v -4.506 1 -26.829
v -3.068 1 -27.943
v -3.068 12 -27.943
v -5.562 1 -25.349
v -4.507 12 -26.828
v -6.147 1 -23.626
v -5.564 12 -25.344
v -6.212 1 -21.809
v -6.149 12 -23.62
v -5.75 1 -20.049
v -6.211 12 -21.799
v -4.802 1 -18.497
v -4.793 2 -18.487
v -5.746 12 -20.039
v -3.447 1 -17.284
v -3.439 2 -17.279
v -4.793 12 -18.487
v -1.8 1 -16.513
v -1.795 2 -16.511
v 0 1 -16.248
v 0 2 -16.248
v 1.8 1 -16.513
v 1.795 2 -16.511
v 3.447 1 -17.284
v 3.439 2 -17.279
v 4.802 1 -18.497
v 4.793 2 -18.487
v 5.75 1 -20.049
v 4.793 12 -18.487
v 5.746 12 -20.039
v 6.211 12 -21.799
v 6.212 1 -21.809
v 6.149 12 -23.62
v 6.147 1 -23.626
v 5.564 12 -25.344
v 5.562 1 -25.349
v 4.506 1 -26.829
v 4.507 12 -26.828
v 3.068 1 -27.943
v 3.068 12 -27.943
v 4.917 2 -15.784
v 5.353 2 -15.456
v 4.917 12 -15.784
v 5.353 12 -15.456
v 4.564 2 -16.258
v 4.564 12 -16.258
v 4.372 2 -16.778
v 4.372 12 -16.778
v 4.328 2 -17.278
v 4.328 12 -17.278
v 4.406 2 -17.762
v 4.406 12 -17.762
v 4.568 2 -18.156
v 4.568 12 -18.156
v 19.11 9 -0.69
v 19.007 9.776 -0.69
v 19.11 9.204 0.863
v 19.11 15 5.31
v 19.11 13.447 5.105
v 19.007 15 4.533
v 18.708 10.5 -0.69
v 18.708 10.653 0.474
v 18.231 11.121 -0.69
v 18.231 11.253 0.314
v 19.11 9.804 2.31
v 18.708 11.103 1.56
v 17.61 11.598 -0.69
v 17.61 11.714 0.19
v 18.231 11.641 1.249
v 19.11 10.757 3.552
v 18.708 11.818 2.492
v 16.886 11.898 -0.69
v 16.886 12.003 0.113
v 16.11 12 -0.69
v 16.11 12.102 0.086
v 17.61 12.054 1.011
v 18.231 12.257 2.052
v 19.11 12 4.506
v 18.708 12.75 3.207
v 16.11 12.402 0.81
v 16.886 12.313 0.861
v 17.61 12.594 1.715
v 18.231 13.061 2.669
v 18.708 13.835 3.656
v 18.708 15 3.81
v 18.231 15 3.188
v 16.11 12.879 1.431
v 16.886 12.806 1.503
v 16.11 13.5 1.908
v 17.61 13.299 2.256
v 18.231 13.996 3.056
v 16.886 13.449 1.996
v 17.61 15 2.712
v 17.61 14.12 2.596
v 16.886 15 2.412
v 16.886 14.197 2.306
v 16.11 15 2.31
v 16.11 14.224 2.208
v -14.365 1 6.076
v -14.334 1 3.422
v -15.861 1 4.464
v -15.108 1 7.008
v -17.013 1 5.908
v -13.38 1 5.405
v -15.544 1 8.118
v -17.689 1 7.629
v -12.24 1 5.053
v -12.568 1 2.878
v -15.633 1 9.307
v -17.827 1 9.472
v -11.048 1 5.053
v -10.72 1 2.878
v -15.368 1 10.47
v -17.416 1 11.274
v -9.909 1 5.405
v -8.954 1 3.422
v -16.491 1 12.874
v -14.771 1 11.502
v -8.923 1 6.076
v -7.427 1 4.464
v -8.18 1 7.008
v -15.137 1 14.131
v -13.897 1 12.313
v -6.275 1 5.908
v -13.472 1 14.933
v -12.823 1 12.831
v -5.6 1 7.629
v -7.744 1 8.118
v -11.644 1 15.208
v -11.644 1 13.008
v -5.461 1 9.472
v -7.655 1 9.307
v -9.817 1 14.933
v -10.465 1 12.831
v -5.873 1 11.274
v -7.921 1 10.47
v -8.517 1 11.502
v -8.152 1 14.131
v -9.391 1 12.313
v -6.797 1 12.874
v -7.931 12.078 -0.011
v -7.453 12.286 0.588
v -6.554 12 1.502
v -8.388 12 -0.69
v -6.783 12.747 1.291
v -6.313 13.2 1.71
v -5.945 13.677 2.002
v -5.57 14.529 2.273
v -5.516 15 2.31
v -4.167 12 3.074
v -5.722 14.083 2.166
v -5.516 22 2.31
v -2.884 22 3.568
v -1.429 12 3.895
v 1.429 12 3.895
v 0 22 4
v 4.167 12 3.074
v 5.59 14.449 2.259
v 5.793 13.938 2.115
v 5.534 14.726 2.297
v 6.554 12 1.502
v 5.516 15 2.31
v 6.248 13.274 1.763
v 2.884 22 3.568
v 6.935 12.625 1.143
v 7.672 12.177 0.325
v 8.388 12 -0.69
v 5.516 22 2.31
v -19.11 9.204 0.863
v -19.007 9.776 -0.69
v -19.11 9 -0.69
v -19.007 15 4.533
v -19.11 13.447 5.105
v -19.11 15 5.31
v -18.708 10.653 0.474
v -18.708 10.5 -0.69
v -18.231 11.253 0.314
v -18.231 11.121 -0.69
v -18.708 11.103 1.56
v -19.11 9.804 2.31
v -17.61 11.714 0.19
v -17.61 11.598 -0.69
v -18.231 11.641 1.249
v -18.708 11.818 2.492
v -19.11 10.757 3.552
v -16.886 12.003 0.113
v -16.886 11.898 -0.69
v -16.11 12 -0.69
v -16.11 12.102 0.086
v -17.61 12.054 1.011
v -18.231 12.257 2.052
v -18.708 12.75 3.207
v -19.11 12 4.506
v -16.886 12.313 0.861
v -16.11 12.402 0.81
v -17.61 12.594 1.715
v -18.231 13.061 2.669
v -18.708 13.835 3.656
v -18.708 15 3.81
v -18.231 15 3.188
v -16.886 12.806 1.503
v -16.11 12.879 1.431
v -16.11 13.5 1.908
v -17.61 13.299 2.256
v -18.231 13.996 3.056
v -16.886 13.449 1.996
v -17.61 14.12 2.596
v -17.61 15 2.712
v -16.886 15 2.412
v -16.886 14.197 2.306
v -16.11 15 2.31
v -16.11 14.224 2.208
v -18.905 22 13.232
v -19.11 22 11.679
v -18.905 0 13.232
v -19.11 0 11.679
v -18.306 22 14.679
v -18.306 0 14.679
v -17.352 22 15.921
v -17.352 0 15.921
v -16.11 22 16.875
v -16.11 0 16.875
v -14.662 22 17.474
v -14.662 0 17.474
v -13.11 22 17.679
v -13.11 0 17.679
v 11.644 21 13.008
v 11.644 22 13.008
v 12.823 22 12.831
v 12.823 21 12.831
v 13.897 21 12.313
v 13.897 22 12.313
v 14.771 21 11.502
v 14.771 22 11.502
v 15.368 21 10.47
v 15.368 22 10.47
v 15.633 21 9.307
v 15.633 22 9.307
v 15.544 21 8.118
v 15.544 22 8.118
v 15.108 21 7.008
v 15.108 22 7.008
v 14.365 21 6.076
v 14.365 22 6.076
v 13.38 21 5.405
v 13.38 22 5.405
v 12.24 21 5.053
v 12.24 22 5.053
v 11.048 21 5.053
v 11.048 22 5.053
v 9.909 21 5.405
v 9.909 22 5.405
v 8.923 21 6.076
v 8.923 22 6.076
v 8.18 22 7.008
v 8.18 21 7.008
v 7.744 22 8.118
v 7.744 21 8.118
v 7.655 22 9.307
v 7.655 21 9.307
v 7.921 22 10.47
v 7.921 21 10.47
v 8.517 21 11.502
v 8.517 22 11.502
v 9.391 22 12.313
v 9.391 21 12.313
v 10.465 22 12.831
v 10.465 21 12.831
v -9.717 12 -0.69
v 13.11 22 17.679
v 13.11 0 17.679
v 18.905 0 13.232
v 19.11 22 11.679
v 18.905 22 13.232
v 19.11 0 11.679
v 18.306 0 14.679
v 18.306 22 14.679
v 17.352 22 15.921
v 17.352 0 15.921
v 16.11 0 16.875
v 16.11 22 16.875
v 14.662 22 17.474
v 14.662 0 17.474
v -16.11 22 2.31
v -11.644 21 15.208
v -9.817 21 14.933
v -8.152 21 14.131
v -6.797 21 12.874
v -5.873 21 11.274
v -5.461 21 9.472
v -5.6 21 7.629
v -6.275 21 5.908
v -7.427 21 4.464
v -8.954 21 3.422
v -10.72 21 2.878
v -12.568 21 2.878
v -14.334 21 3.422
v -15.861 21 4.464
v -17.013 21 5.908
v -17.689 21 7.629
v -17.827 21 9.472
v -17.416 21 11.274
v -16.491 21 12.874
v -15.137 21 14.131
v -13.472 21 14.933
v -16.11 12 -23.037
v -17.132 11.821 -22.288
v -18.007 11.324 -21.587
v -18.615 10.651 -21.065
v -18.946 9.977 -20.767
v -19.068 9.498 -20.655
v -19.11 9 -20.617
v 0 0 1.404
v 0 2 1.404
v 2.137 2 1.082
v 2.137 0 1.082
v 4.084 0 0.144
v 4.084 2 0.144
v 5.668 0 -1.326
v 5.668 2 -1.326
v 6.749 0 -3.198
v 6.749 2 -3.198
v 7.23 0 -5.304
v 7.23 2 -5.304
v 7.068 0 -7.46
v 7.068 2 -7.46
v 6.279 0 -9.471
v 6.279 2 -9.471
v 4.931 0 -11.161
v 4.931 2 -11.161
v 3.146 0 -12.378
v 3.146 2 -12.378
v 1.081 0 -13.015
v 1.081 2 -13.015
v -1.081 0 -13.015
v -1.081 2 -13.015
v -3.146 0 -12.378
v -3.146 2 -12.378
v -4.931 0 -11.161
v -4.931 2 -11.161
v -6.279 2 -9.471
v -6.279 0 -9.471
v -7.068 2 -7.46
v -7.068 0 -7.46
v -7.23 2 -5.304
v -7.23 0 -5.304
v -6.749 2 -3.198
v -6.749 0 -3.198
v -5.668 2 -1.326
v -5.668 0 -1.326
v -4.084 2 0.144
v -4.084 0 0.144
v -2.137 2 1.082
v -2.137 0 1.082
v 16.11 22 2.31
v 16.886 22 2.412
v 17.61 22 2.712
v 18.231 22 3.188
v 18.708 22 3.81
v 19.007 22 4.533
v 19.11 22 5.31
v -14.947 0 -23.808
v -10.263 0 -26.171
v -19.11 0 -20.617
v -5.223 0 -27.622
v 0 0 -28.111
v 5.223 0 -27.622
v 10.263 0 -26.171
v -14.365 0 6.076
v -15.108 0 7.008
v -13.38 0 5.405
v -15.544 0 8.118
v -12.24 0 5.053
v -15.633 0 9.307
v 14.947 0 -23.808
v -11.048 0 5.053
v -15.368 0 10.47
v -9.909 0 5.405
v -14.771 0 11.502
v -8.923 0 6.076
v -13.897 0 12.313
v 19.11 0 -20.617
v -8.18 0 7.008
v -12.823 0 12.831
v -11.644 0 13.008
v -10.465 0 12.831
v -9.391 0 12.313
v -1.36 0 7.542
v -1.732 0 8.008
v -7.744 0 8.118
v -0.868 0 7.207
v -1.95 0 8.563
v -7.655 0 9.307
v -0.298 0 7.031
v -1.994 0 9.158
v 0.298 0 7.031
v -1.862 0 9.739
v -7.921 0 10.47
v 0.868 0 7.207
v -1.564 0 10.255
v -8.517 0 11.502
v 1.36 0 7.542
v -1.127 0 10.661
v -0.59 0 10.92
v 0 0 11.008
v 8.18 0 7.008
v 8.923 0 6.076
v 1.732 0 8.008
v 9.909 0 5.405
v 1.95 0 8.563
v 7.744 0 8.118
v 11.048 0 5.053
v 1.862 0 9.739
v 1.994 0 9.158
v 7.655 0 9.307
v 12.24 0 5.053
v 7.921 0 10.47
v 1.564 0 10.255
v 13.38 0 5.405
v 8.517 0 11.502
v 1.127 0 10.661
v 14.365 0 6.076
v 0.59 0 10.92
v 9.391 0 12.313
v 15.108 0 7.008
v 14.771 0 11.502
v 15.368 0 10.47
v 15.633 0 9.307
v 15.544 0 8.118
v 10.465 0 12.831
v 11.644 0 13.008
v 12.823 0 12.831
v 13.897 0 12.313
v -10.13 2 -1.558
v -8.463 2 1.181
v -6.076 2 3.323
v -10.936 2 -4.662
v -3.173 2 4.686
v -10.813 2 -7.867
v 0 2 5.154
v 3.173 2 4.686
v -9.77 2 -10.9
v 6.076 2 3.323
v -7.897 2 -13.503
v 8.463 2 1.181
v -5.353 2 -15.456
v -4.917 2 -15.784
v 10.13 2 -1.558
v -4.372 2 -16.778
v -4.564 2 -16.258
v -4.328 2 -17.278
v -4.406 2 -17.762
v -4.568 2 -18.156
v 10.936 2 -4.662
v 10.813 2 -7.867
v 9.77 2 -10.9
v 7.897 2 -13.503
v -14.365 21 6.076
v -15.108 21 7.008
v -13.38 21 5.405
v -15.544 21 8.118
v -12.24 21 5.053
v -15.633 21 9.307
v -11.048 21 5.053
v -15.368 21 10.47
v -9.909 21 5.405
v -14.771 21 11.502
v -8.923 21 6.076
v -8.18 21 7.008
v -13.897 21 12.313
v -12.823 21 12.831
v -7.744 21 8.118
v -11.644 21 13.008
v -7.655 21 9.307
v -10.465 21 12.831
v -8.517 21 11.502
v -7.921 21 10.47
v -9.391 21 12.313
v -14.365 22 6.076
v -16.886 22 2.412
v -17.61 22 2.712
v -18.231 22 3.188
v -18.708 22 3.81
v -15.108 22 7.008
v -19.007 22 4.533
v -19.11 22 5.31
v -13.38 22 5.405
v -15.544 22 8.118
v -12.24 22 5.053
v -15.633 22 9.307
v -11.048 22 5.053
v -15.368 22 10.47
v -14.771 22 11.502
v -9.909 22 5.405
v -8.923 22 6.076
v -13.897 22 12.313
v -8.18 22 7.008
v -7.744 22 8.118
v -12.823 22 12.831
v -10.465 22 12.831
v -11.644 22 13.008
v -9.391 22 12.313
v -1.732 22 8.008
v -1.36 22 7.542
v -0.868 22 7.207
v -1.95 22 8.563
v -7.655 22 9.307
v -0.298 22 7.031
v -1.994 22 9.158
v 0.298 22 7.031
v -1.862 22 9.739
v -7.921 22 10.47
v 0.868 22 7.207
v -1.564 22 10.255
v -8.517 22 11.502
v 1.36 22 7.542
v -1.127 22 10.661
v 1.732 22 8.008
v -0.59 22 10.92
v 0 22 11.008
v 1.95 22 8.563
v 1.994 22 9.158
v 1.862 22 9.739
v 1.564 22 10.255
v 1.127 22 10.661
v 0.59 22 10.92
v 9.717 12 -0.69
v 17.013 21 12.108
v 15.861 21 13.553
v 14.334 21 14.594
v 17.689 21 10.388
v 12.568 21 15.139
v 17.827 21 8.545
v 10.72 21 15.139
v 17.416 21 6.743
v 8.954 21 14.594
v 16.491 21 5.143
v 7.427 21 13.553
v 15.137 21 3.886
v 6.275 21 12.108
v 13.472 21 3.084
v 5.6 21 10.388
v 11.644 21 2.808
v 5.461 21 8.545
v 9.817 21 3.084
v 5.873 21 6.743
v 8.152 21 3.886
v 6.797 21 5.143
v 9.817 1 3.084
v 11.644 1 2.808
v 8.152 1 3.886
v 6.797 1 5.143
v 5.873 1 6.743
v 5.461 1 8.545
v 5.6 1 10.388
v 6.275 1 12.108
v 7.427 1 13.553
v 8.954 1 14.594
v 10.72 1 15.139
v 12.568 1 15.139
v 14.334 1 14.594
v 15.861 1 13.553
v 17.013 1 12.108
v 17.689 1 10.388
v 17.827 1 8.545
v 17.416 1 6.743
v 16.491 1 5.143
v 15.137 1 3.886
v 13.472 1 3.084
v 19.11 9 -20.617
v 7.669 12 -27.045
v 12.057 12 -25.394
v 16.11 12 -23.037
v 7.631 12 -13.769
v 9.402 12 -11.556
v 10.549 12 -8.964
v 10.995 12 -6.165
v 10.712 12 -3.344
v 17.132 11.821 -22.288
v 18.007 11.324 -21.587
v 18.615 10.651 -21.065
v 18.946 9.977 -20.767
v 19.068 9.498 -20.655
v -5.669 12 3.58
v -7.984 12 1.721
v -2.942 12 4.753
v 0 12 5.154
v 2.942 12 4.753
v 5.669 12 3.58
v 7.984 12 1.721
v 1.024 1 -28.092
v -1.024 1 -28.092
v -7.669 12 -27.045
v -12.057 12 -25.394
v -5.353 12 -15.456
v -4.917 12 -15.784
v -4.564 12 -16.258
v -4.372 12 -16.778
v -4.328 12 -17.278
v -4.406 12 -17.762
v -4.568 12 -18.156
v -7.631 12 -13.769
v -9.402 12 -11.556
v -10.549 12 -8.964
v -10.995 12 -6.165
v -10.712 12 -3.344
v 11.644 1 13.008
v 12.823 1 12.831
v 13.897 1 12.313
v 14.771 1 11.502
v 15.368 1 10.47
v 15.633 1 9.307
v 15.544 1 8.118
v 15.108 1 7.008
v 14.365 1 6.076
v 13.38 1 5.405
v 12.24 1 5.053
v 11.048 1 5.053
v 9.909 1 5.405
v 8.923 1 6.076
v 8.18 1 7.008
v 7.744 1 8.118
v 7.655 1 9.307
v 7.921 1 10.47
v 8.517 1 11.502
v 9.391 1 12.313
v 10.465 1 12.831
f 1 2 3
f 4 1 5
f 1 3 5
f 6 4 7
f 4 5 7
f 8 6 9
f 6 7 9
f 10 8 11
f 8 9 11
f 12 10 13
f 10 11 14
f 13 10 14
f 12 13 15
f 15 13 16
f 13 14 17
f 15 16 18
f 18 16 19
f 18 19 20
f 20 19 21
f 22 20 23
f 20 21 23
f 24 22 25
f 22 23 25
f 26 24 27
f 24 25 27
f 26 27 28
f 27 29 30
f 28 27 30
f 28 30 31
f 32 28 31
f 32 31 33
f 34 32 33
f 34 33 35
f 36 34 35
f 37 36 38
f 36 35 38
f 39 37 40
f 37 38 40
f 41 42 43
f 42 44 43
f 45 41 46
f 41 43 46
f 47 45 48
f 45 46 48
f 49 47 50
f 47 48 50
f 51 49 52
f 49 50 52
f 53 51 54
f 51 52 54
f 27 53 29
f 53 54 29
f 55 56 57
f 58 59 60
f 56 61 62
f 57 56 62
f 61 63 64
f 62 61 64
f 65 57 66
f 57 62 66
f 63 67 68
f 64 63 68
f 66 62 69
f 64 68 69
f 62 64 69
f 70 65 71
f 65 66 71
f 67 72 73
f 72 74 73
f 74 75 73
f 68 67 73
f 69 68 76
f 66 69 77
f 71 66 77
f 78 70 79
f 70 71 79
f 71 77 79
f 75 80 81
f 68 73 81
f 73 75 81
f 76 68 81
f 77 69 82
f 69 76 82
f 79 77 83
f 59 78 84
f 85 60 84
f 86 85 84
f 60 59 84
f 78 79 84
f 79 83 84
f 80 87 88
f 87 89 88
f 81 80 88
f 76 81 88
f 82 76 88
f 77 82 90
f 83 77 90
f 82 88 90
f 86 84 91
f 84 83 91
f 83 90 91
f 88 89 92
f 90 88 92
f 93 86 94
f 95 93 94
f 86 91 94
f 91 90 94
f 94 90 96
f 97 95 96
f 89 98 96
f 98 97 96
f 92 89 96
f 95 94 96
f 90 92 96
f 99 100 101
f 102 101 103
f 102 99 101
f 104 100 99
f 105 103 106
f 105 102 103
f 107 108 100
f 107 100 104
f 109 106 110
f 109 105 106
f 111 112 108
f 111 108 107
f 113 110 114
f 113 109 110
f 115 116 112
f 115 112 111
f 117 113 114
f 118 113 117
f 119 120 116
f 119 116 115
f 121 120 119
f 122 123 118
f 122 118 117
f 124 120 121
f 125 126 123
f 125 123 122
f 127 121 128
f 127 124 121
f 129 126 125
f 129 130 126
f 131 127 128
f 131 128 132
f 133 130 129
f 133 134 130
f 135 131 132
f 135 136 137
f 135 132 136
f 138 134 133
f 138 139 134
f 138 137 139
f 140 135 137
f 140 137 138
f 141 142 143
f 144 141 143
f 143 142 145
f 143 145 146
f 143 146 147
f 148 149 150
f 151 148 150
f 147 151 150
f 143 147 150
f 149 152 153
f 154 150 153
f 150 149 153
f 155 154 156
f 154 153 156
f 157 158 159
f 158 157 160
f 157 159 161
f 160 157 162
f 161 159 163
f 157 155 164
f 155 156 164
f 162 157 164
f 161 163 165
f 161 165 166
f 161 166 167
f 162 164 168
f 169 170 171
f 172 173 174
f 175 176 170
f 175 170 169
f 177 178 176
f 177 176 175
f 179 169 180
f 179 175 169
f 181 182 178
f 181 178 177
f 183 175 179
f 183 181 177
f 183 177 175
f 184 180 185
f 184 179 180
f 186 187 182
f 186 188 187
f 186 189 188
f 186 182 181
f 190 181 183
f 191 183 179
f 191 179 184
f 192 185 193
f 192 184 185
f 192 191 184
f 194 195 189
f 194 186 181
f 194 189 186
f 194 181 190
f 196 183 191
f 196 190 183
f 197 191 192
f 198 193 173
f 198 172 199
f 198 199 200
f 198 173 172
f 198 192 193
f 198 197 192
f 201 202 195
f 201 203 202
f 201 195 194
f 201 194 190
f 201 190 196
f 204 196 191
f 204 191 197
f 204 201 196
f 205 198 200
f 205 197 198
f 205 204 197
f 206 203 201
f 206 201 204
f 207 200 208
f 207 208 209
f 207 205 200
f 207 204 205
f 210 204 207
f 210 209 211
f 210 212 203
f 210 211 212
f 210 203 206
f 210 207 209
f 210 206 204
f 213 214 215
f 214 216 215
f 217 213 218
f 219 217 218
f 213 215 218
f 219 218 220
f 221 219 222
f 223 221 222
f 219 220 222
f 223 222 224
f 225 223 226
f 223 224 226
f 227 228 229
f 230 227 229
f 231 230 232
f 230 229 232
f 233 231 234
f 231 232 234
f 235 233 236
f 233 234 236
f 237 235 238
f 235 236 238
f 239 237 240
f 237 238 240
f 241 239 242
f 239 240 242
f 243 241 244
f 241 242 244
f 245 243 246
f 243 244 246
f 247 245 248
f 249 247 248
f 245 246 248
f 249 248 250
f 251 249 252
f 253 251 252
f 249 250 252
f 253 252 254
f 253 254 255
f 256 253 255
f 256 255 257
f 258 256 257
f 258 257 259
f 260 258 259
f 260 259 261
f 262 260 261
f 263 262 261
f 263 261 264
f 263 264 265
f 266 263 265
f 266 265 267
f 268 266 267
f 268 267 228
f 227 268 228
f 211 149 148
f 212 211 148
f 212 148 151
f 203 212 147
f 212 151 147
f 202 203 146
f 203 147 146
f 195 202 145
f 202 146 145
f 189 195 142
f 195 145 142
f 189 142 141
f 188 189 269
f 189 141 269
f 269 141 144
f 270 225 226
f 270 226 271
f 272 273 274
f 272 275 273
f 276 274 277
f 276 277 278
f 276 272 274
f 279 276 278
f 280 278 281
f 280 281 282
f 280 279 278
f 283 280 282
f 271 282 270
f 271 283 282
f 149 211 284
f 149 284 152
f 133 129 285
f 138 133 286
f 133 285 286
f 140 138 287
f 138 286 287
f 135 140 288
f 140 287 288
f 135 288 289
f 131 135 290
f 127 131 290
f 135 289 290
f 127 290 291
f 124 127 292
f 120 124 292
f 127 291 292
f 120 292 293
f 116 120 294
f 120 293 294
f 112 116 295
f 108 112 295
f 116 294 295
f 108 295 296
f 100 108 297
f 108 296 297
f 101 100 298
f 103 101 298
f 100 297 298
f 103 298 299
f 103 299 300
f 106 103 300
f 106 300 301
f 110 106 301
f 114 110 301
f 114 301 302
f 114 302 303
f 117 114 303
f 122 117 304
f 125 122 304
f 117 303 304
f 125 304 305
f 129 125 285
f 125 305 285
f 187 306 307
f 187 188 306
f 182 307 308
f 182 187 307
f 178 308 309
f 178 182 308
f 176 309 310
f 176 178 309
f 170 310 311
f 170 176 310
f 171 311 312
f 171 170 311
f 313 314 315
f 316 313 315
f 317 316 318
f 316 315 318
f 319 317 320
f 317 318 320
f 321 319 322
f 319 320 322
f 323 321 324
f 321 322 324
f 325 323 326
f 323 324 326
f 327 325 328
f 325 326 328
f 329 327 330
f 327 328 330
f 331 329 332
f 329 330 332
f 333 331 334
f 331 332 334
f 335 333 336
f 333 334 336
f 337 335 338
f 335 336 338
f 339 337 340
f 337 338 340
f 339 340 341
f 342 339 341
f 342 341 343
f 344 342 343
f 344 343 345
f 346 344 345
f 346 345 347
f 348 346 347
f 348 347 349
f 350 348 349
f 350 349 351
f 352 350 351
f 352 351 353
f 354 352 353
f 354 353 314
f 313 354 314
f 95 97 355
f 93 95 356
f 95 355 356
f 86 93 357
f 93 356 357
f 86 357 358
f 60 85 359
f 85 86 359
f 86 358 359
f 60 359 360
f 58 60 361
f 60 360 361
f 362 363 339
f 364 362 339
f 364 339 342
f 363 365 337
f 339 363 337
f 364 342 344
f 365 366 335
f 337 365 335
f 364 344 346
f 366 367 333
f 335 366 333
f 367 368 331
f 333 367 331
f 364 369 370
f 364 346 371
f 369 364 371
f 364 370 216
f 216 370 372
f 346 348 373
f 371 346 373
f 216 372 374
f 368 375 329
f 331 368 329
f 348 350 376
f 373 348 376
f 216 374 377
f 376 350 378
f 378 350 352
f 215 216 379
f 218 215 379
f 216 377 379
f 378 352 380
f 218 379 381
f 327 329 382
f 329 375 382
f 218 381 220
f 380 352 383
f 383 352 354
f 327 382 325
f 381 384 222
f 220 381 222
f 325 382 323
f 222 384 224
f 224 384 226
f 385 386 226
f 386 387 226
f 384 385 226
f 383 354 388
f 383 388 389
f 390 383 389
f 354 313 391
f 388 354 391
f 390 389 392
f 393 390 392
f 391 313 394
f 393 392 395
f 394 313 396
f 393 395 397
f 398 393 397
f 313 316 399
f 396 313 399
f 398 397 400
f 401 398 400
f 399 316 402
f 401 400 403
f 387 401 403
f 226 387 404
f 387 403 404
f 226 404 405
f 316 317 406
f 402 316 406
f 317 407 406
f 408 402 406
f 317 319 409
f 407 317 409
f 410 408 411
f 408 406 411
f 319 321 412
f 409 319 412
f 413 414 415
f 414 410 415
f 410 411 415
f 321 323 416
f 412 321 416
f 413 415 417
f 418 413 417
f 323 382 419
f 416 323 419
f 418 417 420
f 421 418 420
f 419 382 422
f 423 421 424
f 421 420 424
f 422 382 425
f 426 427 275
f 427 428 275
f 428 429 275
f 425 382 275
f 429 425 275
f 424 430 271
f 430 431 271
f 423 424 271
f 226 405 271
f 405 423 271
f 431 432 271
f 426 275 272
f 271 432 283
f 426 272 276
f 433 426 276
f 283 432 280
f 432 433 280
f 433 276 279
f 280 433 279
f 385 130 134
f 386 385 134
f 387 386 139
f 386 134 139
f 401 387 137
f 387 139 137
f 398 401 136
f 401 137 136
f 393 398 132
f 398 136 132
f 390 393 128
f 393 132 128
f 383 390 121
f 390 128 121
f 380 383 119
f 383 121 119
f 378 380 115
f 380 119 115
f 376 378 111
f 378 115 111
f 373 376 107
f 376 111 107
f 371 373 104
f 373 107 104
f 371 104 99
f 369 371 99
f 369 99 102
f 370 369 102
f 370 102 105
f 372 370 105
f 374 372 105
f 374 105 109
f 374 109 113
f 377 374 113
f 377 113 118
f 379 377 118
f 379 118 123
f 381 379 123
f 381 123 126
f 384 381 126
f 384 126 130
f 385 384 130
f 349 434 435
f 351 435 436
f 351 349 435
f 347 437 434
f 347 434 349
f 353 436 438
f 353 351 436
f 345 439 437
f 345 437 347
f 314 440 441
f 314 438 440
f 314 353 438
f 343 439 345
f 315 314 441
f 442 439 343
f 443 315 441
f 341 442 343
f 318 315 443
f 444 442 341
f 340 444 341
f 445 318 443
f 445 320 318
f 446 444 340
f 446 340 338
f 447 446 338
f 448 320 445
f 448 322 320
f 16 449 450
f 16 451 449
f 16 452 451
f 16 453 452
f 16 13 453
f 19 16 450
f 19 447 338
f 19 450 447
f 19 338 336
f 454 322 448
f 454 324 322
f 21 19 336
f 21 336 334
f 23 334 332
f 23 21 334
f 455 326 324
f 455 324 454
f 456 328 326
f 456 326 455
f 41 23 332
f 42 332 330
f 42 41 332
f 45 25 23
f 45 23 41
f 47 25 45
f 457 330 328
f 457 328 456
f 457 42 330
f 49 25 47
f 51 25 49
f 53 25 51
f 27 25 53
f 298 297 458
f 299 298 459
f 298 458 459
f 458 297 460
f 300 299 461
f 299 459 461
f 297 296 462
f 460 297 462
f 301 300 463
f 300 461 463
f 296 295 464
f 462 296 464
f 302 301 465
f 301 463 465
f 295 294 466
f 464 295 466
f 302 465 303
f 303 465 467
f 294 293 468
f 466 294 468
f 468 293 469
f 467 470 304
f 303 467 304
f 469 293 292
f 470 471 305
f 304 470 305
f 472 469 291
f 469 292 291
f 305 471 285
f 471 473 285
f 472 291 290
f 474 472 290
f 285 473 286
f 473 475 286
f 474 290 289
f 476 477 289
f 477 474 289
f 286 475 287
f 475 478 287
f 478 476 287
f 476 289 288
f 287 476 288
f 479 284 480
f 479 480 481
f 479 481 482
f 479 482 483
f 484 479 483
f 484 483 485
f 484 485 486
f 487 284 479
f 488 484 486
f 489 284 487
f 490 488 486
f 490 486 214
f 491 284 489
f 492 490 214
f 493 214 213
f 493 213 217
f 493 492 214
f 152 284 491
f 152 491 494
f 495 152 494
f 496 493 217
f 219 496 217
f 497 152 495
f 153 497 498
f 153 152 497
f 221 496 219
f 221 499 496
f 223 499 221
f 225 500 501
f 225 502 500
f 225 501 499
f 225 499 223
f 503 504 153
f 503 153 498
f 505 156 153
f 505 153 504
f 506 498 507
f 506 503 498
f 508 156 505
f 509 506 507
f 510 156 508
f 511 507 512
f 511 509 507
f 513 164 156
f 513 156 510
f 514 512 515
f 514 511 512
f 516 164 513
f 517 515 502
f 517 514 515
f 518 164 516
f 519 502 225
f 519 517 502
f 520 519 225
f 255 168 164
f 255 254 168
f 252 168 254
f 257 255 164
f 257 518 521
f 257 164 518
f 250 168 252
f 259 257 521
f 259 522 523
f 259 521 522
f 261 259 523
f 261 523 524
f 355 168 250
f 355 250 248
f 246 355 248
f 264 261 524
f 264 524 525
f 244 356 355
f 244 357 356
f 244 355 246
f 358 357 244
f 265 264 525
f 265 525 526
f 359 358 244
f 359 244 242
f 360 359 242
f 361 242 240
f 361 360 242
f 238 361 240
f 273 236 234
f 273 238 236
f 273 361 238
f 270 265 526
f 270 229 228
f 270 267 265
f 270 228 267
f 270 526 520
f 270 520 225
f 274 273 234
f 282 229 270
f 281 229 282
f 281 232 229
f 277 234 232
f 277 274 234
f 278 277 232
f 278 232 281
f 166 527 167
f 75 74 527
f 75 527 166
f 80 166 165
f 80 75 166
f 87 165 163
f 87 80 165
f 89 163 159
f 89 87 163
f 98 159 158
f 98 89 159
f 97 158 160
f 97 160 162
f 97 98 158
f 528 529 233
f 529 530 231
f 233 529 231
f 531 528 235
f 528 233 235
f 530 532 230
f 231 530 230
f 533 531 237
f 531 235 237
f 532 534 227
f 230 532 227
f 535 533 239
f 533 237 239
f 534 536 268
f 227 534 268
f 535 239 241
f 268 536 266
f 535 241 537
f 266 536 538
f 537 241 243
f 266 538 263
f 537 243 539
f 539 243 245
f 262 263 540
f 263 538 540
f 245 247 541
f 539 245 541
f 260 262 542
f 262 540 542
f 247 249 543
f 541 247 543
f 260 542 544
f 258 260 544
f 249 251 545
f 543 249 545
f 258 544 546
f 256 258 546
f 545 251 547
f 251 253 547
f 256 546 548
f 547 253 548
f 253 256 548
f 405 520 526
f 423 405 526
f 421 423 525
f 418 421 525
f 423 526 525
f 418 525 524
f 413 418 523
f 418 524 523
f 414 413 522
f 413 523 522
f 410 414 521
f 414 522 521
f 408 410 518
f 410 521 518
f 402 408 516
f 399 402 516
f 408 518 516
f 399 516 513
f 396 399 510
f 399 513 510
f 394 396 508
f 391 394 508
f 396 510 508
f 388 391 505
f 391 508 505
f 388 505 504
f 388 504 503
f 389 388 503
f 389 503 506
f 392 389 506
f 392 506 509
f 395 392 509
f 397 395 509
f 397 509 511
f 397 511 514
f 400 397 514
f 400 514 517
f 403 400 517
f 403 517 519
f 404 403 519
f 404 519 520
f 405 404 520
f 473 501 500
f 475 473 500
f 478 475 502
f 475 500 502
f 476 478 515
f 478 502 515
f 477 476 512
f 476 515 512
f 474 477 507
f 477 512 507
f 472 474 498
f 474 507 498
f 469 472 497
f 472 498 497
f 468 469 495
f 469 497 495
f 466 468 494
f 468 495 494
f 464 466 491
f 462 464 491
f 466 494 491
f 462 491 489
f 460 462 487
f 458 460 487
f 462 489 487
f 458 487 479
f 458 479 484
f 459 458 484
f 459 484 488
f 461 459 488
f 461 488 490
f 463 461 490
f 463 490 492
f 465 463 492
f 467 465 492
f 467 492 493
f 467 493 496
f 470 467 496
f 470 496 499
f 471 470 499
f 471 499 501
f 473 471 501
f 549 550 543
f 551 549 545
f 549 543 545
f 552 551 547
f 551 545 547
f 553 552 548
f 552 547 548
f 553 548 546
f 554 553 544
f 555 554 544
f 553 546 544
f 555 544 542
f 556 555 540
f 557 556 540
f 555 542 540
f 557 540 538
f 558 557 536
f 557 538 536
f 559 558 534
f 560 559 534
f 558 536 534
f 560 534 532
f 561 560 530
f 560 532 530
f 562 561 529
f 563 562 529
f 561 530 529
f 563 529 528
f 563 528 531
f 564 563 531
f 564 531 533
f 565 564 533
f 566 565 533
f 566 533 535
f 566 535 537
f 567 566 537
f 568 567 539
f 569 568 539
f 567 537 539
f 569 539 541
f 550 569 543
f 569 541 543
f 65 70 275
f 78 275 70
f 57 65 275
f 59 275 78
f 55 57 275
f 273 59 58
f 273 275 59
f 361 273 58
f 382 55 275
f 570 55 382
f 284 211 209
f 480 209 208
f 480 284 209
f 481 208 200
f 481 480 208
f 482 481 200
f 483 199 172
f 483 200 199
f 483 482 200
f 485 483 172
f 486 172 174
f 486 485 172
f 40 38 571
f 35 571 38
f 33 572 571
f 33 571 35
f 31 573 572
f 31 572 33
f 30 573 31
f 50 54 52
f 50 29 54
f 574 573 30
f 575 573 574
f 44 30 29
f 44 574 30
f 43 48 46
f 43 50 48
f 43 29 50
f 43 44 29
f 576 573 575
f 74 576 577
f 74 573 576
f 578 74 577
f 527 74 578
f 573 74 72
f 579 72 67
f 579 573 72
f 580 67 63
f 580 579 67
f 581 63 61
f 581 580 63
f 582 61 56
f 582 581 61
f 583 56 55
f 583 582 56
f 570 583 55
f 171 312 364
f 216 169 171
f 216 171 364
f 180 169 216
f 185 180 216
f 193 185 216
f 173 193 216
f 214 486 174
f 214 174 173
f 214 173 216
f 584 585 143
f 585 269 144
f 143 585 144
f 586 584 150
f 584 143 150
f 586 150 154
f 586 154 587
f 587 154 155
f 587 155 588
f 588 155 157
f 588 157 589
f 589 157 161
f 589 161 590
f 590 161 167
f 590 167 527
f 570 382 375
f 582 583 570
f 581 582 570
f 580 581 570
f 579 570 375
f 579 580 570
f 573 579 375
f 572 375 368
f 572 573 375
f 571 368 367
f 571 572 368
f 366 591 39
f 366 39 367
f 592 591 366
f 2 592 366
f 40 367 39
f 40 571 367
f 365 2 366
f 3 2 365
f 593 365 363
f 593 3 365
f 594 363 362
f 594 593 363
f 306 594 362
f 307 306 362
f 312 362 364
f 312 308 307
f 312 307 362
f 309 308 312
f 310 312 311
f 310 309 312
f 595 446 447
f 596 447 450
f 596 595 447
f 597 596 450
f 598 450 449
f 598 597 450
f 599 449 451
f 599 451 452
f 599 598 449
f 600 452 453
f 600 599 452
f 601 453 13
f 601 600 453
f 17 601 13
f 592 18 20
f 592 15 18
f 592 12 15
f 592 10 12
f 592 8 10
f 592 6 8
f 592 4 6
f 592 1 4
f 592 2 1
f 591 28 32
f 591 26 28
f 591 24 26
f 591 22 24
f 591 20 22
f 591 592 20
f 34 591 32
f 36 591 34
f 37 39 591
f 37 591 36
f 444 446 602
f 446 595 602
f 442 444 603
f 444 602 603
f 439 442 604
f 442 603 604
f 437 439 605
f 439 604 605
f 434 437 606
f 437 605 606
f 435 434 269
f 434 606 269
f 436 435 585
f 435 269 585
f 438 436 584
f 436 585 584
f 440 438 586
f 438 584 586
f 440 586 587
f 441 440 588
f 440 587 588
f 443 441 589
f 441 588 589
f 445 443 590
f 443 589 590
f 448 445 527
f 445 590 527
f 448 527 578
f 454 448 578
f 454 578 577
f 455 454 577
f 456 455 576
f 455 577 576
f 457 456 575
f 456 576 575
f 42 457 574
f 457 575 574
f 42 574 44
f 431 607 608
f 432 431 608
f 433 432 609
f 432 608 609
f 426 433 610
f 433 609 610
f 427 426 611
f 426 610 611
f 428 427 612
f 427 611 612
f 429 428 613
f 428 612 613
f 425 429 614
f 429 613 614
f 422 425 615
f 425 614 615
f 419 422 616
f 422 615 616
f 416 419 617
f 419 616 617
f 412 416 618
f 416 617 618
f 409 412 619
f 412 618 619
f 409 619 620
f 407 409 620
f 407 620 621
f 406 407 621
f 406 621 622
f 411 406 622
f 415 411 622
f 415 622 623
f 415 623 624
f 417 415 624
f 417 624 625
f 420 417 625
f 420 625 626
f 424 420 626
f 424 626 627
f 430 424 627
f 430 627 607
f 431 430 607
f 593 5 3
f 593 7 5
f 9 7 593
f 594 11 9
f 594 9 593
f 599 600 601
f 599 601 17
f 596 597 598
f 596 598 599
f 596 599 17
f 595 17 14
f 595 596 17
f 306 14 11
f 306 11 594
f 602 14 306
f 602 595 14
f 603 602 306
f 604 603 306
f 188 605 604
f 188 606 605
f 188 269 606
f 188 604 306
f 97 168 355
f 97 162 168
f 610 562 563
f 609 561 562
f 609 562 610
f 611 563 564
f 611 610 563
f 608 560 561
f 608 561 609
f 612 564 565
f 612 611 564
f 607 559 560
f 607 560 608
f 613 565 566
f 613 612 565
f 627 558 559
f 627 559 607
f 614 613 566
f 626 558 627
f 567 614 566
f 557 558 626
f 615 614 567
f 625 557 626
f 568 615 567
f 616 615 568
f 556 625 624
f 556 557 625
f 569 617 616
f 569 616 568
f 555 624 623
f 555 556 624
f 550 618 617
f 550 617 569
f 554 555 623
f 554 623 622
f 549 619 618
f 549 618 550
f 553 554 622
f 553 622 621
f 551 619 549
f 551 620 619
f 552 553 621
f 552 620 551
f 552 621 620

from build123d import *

# Parameters (mm, degrees)
SKETCH1_R           = 34.445
BOSS_EXTRUDE1_DEPTH = 22
SKETCH15_R          = 34.445
CUT_EXTRUDE2_DEPTH  = 54.450126754
CUT_EXTRUDE4_START  = -1
SKETCH17_R          = 6.2
CUT_EXTRUDE4_DEPTH  = 20
SKETCH18_R          = 7.25
CUT_EXTRUDE5_DEPTH  = 41.489614217
SKETCH19_R          = 6.25
CUT_EXTRUDE7_DEPTH  = 21
SKETCH20_R          = 9.845995641
CUT_EXTRUDE9_DEPTH  = 10
FILLET12_R          = 6
SKETCH23_R          = 4
SKETCH23_R_2        = 2
CUT_EXTRUDE10_DEPTH = 41.489614217
CUT_EXTRUDE11_START = -12
CUT_EXTRUDE11_DEPTH = 29.489614217
FILLET19_R          = 3
SKETCH25_R          = 11
CUT_EXTRUDE12_DEPTH = 10
FILLET20_R          = 2


with BuildPart() as part:
    # Sketch1 → Boss-Extrude1 (new body)
    with BuildSketch(Plane(origin=(0, 0, 0), x_dir=(1, 0, 0), z_dir=(0, 1, 0))):
        with Locations(Location((0, 0, 0), (0, 0, 270))):
            Circle(SKETCH1_R)
    extrude(amount=BOSS_EXTRUDE1_DEPTH)

    # Sketch15 → Cut-Extrude2 (cut, through all)
    with BuildSketch(Plane(origin=(0, 22, 0), x_dir=(1, 0, 0), z_dir=(0, 1, 0))):
        Circle(SKETCH15_R)
        with BuildLine():
            Line((-19.109582045, 20.616901016), (-19.109582045, -17.678671312))
            Line((-19.109582045, -17.678671312), (19.109582045, -17.678671312))
            Line((19.109582045, -17.678671312), (19.109582045, 20.616901016))
            ThreePointArc((19.109582045, 20.616901016), (0, 28.111078483), (-19.109582045, 20.616901016))
        make_face(mode=Mode.SUBTRACT)
    extrude(amount=-CUT_EXTRUDE2_DEPTH, mode=Mode.SUBTRACT)

    # Sketch17 → Cut-Extrude4 (cut)
    with BuildSketch(Plane(origin=(0, 22, 0), x_dir=(1, 0, 0), z_dir=(0, 1, 0)).offset(CUT_EXTRUDE4_START)):
        with Locations(Location((-11.644122412, -9.008465082, 0), (0, 0, 270))):
            Circle(SKETCH17_R)
        with Locations(Location((11.644122412, -9.008465082, 0), (0, 0, 90))):
            Circle(SKETCH17_R)
    extrude(amount=-CUT_EXTRUDE4_DEPTH, mode=Mode.SUBTRACT)

    # Sketch18 → Cut-Extrude5 (cut, through all)
    with BuildSketch(Plane(origin=(0, 22, 0), x_dir=(1, 0, 0), z_dir=(0, 1, 0))):
        with Locations(Location((0, 5.846291401, 0), (0, 0, 270))):
            Circle(SKETCH18_R)
    extrude(amount=-CUT_EXTRUDE5_DEPTH, mode=Mode.SUBTRACT)

    # Sketch19 → Cut-Extrude7 (cut)
    with BuildSketch(Plane(origin=(0, 22, 0), x_dir=(1, 0, 0), z_dir=(0, 1, 0))):
        with Locations((0, 22.497935332)):
            Circle(SKETCH19_R)
    extrude(amount=-CUT_EXTRUDE7_DEPTH, mode=Mode.SUBTRACT)

    # Sketch20 → Cut-Extrude9 (cut)
    with BuildSketch(Plane(origin=(0, 22, 0), x_dir=(1, 0, 0), z_dir=(0, 1, 0))):
        with Locations(Location((0, 5.846291401, 0), (0, 0, 270))):
            Circle(SKETCH20_R)
    extrude(amount=-CUT_EXTRUDE9_DEPTH, mode=Mode.SUBTRACT)

    # Fillet12
    fillet12_edges = [part.edges().sort_by_distance(p)[0] for p in [
        (-19.109582045, 11, 17.678671312),
        (19.109582045, 11, 17.678671312),
    ]]
    fillet(fillet12_edges, radius=FILLET12_R)

    # Sketch23 → Cut-Extrude10 (cut, through all)
    with BuildSketch(Plane(origin=(0, 22, 0), x_dir=(1, 0, 0), z_dir=(0, 1, 0))):
        with Locations(Location((-11.644122412, -9.008465082, 0), (0, 0, 270))):
            Circle(SKETCH23_R)
        with Locations(Location((11.644122412, -9.008465082, 0), (0, 0, 270))):
            Circle(SKETCH23_R)
        with Locations(Location((0, -9.008465082, 0), (0, 0, 270))):
            Circle(SKETCH23_R_2)
    extrude(amount=-CUT_EXTRUDE10_DEPTH, mode=Mode.SUBTRACT)

    # Sketch24 → Cut-Extrude11 (cut, through all)
    with BuildSketch(Plane.XZ.offset(CUT_EXTRUDE11_START)):
        with BuildLine():
            Line((-19.109582045, -20.616901016), (-19.109582045, 2.30978602))
            Line((-19.109582045, 2.30978602), (19.109582045, 2.30978602))
            Line((19.109582045, 2.30978602), (19.109582045, -20.616901016))
            ThreePointArc((19.109582045, -20.616901016), (0, -28.111078483), (-19.109582045, -20.616901016))
        make_face()
    extrude(amount=-CUT_EXTRUDE11_DEPTH, mode=Mode.SUBTRACT)

    # Fillet19
    fillet19_edges = [part.edges().sort_by_distance(p)[0] for p in [
        (-19.109582045, 17, 2.30978602),
        (12.31259954, 12, 2.30978602),
        (-12.31259954, 12, 2.30978602),
        (-19.109582045, 12, -9.153557498),
        (19.109582045, 12, -9.153557498),
        (19.109582045, 17, 2.30978602),
    ]]
    fillet(fillet19_edges, radius=FILLET19_R)

    # Sketch25 → Cut-Extrude12 (cut)
    with BuildSketch(Plane(origin=(0, 12, 0), x_dir=(1, 0, 0), z_dir=(0, 1, 0))):
        with Locations((0, 5.846291401)):
            Circle(SKETCH25_R)
    extrude(amount=-CUT_EXTRUDE12_DEPTH, mode=Mode.SUBTRACT)

    # Fillet20
    fillet20_edges = [part.edges().sort_by_distance(p)[0] for p in [
        (2.158391198, 7, -16.632456031),
        (-2.158391198, 7, -16.632456031),
    ]]
    fillet(fillet20_edges, radius=FILLET20_R)


solid = part.part
